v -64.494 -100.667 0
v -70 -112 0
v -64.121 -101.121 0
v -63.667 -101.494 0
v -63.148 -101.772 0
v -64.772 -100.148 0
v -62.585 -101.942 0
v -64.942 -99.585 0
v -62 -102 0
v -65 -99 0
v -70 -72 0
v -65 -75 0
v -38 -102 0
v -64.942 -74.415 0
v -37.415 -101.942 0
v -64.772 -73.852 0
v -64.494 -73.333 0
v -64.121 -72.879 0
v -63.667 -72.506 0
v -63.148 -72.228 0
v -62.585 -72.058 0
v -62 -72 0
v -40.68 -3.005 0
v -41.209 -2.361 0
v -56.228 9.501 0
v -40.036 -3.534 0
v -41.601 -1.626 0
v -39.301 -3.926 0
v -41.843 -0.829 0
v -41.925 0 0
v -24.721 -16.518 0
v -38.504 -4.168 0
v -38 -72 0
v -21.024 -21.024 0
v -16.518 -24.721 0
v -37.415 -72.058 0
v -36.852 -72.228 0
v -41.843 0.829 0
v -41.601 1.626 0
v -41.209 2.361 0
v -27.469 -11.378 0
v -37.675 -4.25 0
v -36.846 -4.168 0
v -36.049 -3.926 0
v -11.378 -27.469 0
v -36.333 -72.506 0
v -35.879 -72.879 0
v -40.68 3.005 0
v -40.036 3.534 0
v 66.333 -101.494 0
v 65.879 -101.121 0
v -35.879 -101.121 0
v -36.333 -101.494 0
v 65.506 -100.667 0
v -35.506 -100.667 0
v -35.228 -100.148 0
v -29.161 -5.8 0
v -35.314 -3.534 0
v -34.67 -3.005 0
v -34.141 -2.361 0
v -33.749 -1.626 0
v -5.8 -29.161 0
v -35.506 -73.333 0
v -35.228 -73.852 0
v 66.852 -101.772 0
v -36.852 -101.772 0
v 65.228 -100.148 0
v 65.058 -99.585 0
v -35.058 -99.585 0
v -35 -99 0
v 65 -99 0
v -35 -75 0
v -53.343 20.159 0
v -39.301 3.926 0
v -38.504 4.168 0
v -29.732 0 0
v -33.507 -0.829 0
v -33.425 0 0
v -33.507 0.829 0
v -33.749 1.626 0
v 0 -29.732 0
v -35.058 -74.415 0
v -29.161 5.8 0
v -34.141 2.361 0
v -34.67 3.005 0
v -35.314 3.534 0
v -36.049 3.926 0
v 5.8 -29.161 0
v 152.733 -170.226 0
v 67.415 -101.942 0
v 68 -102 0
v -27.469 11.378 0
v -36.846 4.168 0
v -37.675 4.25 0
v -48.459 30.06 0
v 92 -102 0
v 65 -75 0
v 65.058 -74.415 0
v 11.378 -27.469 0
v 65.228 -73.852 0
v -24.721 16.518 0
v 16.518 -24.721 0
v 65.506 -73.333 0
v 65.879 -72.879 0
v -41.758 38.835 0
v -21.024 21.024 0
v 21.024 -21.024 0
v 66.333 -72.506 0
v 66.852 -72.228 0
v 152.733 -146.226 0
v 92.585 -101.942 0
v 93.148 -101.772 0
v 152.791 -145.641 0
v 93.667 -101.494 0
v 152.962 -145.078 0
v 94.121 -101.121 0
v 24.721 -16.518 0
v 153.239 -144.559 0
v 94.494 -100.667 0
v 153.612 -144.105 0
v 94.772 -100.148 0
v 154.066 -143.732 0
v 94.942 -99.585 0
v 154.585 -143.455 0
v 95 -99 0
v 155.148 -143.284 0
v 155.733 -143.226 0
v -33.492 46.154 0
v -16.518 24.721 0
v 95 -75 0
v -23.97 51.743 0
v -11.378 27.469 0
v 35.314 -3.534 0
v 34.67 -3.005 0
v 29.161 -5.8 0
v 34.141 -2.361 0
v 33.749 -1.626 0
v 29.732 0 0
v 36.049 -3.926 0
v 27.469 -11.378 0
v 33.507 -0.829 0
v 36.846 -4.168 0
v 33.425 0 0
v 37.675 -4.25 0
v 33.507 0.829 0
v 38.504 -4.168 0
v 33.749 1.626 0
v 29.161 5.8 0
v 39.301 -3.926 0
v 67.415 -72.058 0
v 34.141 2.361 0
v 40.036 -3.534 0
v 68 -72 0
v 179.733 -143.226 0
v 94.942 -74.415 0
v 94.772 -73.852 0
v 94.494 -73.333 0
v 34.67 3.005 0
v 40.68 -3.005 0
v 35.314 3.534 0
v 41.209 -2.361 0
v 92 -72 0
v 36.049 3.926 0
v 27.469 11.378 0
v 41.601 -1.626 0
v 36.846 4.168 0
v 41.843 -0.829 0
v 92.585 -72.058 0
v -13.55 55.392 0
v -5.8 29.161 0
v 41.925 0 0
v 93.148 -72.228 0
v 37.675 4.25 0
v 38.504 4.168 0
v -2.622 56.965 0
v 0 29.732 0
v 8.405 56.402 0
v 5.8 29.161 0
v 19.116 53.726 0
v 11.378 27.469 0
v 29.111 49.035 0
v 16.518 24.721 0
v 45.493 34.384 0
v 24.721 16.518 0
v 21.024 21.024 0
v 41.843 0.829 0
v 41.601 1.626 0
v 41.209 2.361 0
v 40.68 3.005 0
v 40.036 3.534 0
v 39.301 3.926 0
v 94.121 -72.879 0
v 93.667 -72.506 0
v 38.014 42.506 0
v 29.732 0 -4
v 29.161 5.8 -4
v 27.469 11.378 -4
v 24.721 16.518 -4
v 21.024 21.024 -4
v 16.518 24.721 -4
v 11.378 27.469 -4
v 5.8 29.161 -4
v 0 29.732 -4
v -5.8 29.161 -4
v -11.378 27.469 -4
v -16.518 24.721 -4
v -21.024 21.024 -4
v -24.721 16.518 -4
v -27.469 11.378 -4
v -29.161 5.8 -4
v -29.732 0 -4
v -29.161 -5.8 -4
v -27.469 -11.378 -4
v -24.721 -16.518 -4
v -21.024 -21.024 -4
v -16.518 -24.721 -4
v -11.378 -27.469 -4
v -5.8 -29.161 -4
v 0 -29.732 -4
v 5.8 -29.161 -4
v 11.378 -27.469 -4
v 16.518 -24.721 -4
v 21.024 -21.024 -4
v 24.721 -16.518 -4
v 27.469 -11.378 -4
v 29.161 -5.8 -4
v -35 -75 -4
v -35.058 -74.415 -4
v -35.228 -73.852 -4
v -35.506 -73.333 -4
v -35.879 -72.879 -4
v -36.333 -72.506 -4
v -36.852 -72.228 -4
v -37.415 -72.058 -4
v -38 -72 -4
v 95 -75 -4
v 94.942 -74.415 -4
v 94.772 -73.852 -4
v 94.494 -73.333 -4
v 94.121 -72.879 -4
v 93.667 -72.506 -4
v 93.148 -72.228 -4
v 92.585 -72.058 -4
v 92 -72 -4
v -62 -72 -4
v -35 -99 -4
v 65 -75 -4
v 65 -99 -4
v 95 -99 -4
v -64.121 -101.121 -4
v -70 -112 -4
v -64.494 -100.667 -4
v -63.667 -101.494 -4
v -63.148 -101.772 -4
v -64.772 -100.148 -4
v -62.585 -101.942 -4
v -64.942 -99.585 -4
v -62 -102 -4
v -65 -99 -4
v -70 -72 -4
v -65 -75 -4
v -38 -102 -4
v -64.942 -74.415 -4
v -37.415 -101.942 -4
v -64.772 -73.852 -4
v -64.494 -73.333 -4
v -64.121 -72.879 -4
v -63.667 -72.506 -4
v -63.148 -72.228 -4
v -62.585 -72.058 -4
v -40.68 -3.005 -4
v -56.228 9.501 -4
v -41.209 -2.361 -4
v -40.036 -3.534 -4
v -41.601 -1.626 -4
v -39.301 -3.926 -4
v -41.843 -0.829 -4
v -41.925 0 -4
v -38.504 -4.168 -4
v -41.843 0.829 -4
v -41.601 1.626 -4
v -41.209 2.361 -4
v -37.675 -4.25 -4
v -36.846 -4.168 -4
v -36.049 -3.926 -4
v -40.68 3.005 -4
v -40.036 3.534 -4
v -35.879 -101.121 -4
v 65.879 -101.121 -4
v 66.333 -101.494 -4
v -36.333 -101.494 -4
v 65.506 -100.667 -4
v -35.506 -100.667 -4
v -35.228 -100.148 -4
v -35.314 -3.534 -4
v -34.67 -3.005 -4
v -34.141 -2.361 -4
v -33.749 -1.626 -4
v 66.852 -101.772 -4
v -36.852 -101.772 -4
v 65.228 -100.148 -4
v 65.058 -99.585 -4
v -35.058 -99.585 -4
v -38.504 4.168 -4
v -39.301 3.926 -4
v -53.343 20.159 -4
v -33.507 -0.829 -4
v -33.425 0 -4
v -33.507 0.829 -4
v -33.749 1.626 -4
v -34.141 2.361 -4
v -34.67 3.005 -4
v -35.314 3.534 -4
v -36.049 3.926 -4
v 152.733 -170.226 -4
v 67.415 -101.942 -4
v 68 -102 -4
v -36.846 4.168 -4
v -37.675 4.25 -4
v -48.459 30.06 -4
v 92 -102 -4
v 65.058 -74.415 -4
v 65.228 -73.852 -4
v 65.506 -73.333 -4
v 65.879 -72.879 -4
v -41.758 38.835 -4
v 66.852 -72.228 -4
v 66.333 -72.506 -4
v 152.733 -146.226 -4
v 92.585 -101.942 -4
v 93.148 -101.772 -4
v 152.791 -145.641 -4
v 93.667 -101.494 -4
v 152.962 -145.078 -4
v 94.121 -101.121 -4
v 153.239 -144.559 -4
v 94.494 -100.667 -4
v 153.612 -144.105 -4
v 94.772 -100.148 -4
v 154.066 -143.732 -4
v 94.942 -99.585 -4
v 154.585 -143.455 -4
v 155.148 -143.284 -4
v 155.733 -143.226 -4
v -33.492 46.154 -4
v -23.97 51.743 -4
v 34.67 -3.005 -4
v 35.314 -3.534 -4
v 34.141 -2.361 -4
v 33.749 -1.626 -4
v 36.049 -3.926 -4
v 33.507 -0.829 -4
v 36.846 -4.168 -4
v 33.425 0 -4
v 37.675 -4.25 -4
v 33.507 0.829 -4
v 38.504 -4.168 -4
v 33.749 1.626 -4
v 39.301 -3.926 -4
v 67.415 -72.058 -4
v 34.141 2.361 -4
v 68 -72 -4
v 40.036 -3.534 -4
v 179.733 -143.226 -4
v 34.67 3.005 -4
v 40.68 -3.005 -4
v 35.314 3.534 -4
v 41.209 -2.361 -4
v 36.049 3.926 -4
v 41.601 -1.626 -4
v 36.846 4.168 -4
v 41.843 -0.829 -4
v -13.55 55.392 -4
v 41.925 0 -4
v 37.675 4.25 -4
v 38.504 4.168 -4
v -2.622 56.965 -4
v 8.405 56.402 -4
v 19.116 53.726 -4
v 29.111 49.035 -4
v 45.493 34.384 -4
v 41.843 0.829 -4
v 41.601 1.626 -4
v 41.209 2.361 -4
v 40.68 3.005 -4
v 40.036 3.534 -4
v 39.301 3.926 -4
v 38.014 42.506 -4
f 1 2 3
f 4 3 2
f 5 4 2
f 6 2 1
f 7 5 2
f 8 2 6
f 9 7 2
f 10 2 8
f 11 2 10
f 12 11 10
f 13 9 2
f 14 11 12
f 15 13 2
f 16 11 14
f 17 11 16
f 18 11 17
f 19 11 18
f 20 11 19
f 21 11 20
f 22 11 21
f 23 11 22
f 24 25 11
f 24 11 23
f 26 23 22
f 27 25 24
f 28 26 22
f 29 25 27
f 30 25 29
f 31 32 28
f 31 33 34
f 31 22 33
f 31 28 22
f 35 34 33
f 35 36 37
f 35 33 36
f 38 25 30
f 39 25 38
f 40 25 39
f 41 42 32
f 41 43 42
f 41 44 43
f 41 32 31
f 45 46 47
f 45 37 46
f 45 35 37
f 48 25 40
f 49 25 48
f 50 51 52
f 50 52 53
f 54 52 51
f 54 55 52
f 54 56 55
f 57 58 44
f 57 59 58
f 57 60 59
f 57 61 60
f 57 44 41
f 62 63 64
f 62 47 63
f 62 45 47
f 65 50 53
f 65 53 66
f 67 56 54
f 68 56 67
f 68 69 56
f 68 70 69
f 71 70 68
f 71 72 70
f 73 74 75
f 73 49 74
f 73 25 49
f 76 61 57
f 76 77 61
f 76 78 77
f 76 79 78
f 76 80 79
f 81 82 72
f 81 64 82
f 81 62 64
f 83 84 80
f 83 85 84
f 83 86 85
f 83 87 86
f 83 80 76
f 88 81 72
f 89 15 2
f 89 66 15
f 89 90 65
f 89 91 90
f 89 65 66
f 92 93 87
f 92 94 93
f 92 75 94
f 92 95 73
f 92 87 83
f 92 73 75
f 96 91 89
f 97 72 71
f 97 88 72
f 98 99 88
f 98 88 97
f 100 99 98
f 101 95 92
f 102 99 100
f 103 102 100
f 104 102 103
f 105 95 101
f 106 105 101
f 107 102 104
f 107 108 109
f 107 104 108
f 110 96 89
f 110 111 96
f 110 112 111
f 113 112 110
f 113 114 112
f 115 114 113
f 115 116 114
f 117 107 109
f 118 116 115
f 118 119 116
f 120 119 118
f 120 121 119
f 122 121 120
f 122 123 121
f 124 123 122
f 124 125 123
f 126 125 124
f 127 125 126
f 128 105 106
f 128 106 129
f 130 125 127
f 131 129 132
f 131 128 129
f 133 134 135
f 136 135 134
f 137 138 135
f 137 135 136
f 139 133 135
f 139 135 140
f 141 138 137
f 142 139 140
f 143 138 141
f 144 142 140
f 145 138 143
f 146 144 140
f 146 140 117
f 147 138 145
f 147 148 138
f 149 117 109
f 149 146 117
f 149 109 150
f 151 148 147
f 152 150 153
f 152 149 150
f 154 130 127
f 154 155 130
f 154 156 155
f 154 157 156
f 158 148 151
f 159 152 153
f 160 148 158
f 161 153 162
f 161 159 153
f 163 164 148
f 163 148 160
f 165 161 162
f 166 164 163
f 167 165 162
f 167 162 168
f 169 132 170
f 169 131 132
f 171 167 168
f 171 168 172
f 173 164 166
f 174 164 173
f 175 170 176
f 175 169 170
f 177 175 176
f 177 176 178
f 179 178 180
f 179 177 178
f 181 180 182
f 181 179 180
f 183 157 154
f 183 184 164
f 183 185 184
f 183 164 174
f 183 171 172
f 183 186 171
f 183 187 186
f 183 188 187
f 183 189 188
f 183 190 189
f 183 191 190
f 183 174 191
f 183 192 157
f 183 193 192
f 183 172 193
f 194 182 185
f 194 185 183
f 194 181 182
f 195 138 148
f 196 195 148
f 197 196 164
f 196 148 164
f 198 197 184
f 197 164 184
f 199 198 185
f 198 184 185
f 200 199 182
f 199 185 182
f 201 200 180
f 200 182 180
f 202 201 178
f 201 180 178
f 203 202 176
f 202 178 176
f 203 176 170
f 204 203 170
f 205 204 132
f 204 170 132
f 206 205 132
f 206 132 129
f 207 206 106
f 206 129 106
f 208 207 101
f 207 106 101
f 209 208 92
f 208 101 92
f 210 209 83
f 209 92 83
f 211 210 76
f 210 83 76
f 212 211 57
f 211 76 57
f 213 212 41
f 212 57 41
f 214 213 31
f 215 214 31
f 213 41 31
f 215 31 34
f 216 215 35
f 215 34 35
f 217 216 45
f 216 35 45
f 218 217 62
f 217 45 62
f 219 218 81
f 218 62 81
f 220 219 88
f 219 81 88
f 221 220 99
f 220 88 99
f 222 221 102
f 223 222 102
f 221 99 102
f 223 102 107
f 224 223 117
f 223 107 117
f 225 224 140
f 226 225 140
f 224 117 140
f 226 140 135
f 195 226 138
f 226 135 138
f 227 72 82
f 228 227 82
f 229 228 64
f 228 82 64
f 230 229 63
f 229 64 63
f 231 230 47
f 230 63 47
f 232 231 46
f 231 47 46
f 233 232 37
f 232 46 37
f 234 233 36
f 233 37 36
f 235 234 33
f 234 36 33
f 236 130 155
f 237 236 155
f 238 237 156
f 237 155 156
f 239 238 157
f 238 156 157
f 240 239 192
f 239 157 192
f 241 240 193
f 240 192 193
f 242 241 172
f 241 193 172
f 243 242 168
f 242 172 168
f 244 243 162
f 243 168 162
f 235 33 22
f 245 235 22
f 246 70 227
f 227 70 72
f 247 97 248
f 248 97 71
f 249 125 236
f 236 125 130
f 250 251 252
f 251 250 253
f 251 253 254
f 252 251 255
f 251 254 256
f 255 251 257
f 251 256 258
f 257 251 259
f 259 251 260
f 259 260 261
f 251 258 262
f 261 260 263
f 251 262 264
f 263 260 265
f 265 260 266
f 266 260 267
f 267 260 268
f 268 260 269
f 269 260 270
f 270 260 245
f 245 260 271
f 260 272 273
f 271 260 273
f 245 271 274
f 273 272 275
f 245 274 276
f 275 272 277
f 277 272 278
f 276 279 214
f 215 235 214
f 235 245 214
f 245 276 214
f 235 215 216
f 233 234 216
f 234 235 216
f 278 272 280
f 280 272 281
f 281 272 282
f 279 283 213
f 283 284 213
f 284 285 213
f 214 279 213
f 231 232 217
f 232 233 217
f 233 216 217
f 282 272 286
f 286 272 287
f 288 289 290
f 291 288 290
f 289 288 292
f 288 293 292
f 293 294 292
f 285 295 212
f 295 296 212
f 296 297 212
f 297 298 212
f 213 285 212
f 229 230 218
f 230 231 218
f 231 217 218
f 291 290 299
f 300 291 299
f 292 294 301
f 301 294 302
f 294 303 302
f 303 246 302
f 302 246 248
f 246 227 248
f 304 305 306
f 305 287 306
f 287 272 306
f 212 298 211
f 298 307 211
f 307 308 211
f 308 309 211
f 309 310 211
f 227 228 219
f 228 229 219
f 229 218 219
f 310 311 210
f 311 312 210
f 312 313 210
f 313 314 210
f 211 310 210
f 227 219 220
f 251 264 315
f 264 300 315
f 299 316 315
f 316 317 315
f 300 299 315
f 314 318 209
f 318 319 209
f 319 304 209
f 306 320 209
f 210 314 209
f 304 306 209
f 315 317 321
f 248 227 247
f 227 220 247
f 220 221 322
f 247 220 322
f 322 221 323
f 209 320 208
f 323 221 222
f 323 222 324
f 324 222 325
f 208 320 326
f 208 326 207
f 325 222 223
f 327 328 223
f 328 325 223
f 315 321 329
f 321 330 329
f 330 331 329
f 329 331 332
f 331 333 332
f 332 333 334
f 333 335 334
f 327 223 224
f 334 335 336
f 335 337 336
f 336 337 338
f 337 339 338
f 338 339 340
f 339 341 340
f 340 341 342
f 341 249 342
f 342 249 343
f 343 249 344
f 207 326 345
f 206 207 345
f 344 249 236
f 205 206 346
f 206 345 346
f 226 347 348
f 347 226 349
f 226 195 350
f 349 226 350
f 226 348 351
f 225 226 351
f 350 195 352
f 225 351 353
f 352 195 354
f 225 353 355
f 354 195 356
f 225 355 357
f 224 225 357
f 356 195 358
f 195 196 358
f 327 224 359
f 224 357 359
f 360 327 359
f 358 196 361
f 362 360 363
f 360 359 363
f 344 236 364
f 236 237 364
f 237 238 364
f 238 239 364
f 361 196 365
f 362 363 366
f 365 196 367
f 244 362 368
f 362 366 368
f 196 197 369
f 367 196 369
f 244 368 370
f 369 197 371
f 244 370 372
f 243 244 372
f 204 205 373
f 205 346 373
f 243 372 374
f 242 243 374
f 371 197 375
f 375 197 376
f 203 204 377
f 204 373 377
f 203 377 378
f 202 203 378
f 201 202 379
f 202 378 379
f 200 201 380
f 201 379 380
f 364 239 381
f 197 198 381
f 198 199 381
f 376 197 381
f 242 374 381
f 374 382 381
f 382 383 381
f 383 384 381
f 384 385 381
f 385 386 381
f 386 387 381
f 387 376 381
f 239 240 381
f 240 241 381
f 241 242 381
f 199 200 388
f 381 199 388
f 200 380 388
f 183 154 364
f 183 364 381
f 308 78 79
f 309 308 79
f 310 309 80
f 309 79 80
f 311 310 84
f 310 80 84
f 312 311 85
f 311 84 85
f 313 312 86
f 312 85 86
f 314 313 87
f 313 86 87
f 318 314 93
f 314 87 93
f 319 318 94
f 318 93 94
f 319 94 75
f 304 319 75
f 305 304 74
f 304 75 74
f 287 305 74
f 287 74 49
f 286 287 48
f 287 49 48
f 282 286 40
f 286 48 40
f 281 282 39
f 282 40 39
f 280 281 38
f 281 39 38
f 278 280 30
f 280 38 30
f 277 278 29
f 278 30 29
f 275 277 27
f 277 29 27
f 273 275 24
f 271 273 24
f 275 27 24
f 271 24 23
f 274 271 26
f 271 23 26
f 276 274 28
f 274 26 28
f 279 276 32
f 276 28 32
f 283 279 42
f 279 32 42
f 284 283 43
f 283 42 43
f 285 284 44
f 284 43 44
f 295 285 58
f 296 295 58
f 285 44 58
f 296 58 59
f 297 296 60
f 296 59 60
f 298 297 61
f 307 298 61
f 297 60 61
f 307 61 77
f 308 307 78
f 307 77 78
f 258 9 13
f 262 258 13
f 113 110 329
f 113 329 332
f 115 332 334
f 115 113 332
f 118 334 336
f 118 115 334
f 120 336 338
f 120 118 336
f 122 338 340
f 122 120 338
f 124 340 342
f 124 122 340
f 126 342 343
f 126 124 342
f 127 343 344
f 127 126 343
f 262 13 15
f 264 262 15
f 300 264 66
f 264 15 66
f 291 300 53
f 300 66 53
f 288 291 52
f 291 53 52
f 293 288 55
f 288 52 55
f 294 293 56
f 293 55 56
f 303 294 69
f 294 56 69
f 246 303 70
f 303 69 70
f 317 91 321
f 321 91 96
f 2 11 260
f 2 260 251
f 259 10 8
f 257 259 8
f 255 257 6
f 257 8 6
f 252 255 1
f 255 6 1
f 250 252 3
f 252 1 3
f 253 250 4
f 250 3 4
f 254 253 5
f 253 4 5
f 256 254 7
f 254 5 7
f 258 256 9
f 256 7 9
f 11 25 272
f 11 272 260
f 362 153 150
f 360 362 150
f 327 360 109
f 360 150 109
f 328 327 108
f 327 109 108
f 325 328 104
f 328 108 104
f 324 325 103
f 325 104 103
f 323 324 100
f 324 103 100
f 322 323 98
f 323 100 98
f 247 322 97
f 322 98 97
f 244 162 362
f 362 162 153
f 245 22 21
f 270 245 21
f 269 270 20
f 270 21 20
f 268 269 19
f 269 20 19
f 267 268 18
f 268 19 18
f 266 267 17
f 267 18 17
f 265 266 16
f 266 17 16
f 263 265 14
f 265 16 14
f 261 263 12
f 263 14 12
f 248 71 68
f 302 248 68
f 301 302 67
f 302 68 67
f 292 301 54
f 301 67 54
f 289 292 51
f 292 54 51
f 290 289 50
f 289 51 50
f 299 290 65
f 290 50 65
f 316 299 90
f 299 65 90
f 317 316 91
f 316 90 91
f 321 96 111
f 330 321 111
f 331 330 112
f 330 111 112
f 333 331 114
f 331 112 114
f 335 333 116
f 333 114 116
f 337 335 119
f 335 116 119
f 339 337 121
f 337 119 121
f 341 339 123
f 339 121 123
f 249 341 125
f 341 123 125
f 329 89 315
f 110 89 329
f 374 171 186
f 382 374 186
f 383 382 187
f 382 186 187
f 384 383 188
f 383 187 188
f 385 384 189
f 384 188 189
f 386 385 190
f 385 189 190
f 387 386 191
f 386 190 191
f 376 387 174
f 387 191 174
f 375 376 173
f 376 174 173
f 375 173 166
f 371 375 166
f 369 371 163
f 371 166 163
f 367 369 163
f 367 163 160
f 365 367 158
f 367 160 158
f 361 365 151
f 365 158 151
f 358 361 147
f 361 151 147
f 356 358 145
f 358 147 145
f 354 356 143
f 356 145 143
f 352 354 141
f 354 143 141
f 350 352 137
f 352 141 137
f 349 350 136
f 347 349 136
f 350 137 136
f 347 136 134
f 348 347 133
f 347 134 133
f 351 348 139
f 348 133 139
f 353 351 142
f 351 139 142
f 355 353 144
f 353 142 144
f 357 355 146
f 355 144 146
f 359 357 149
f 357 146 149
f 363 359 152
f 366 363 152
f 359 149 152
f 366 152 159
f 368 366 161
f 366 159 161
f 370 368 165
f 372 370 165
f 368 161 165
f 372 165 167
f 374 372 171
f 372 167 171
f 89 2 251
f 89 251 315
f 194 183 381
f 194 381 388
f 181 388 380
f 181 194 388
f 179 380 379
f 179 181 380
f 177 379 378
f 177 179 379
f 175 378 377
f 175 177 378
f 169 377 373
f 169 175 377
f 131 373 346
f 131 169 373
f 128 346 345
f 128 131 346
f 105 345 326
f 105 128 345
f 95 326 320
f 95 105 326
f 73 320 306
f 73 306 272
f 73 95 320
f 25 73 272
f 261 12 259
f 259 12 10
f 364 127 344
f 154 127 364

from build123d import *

# Parameters (mm, degrees)
SKETCH_1_R             = 4.25
SKETCH_1_R_2           = 29.732137495
SM_BASE_FLANGE_1_DEPTH = 4


# Sheet-metal steps are written as plain solids
with BuildPart() as part:
    # Sketch 1 → Базовая кромка1 (new body)
    with BuildSketch(Plane.XY):
        with BuildLine():
            Line((179.733197448, -143.22618932), (45.492707493, 34.38406884))
            ThreePointArc((45.492707493, 34.38406884), (-13.549825845, 55.391812072), (-56.227876086, 9.501398625))
            Line((-56.227876086, 9.501398625), (-70, -72))
            Line((-70, -72), (-70, -112))
            Line((-70, -112), (152.733197448, -170.22618932))
            Line((152.733197448, -170.22618932), (152.733197448, -146.22618932))
            ThreePointArc((152.733197448, -146.22618932), (153.611877105, -144.104868976), (155.733197448, -143.22618932))
            Line((155.733197448, -143.22618932), (179.733197448, -143.22618932))
        make_face()
        with Locations((-37.675, 0)):
            Circle(SKETCH_1_R, mode=Mode.SUBTRACT)
        Circle(SKETCH_1_R_2, mode=Mode.SUBTRACT)
        with Locations((37.675, 0)):
            Circle(SKETCH_1_R, mode=Mode.SUBTRACT)
        with BuildLine():
            Line((-62, -102), (-38, -102))
            ThreePointArc((-38, -102), (-35.878679656, -101.121320344), (-35, -99))
            Line((-35, -99), (-35, -75))
            ThreePointArc((-35, -75), (-35.878679656, -72.878679656), (-38, -72))
            Line((-38, -72), (-62, -72))
            ThreePointArc((-62, -72), (-64.121320344, -72.878679656), (-65, -75))
            Line((-65, -75), (-65, -99))
            ThreePointArc((-65, -99), (-64.121320344, -101.121320344), (-62, -102))
        make_face(mode=Mode.SUBTRACT)
        with BuildLine():
            Line((68, -102), (92, -102))
            ThreePointArc((92, -102), (94.121320344, -101.121320344), (95, -99))
            Line((95, -99), (95, -75))
            ThreePointArc((95, -75), (94.121320344, -72.878679656), (92, -72))
            Line((92, -72), (68, -72))
            ThreePointArc((68, -72), (65.878679656, -72.878679656), (65, -75))
            Line((65, -75), (65, -99))
            ThreePointArc((65, -99), (65.878679656, -101.121320344), (68, -102))
        make_face(mode=Mode.SUBTRACT)
    extrude(amount=-SM_BASE_FLANGE_1_DEPTH)


solid = part.part
